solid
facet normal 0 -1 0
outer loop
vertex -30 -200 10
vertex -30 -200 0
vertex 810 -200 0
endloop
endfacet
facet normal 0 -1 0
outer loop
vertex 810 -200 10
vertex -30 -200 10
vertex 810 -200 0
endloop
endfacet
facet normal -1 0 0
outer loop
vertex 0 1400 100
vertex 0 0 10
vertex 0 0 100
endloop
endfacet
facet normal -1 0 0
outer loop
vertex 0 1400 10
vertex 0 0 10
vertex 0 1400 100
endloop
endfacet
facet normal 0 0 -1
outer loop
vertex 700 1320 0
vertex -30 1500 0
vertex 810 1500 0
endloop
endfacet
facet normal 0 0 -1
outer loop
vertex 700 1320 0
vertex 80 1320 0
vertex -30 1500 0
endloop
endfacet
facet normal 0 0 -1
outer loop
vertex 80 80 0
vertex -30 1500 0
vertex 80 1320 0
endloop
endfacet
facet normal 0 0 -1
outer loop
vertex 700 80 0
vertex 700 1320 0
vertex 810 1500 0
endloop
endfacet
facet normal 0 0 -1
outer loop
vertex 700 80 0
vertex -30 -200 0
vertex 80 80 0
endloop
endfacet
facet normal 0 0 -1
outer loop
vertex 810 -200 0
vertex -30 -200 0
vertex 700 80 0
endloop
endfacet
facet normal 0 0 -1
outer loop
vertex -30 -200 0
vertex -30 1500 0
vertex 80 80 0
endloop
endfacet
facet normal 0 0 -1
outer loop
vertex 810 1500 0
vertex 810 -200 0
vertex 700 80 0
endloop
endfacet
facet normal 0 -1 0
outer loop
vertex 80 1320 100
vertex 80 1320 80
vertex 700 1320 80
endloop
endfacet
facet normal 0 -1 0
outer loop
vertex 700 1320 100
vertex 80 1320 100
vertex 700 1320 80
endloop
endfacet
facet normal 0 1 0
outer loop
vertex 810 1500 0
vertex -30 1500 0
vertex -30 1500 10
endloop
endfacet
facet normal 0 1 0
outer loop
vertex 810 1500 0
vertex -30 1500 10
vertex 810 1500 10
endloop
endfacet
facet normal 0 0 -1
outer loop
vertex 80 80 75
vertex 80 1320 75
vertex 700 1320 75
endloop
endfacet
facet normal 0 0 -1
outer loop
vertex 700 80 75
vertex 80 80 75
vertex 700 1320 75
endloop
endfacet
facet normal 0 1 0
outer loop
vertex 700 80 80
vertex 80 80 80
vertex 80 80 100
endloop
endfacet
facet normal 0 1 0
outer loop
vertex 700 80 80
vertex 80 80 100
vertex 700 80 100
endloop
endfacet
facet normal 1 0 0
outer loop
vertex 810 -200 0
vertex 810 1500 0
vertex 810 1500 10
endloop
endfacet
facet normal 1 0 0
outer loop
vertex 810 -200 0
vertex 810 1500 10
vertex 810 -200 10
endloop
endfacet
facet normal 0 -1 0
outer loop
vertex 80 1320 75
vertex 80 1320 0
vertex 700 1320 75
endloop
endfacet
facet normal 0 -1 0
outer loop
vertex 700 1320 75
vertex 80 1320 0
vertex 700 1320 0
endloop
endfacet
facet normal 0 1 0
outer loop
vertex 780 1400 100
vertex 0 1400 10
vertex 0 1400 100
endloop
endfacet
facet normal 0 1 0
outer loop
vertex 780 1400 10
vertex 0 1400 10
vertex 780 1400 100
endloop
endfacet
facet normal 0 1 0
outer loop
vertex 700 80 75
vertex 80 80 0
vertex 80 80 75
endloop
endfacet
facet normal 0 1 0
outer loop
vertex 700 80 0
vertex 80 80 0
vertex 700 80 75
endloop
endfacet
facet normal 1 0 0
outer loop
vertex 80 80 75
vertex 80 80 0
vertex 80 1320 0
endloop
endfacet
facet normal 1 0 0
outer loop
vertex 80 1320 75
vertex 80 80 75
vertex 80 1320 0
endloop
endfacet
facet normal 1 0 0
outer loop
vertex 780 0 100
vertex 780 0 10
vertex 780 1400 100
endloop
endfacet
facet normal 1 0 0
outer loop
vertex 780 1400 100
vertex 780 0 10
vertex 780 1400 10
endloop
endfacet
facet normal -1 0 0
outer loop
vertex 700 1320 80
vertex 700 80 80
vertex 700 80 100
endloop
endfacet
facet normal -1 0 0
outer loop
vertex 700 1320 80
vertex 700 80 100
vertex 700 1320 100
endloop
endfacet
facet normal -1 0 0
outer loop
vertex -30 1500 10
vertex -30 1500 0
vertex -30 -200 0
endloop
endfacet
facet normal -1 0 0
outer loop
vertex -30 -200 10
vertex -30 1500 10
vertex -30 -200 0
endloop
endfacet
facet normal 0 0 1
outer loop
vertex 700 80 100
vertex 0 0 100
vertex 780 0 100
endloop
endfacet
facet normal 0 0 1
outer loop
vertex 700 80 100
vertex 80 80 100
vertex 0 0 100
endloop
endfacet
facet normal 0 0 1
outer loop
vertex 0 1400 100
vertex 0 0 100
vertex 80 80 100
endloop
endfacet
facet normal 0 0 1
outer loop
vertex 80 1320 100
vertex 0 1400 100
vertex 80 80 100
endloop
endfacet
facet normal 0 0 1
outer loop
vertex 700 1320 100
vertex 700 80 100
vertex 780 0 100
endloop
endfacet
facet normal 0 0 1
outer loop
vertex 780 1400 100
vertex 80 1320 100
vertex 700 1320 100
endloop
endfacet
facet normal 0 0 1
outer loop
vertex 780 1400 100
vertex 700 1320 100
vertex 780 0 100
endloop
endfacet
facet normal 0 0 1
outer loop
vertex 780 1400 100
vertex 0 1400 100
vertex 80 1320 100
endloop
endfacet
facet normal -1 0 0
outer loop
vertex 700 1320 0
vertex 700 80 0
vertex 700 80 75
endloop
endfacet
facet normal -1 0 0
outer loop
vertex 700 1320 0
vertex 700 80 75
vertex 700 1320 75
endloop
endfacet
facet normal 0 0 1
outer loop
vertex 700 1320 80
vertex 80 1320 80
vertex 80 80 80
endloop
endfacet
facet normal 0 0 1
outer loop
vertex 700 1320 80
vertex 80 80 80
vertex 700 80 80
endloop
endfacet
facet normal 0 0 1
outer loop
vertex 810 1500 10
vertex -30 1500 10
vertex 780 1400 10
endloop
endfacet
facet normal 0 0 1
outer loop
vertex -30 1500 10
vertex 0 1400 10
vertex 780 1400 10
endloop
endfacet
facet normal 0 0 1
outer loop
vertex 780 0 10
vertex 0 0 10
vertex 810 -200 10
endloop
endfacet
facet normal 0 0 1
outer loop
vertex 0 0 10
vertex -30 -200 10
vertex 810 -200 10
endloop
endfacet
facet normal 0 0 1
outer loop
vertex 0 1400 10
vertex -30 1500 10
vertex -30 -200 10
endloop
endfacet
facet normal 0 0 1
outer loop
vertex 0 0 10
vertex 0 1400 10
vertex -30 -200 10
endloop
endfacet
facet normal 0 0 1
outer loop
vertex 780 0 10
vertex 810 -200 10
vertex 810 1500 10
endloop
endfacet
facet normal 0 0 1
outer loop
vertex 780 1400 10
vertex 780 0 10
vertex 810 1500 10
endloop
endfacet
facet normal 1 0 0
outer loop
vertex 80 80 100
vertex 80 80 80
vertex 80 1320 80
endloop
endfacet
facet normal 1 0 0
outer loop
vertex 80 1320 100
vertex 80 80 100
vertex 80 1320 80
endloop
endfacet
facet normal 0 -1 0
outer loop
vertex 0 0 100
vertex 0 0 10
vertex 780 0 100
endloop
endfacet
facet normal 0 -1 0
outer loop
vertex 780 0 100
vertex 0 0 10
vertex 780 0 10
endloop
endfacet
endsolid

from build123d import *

# Parameters (mm, degrees)
F0_W     = 780
F0_H     = 1400
F0_W_2   = 620
F0_H_2   = 1240
F1_DEPTH = 100
F2_W     = 840
F2_H     = 1700
F2_W_2   = 780
F2_H_2   = 1400
F3_DEPTH = 10
F5_W     = 620
F5_H     = 1240
F6_DEPTH = 5


with BuildPart() as f1:
    # F0 (on Top) → F1 (new body)
    with BuildSketch(Plane.XY):
        with Locations((390, 700)):
            Rectangle(F0_W, F0_H)
        with Locations((390, 700)):
            Rectangle(F0_W_2, F0_H_2, mode=Mode.SUBTRACT)
    extrude(amount=F1_DEPTH)

    # F2 (on face) → F3 (join)
    with BuildSketch(Plane(origin=(0, 0, 0), x_dir=(1, 0, 0), z_dir=(0, 0, -1))):
        with Locations((390, -650)):
            Rectangle(F2_W, F2_H)
        with Locations((390, -700)):
            Rectangle(F2_W_2, F2_H_2, mode=Mode.SUBTRACT)
    extrude(amount=-F3_DEPTH)

    # F5 (on offset) → F6 (join)
    with BuildSketch(Plane.XY.offset(75)):
        with Locations((390, 700)):
            Rectangle(F5_W, F5_H)
    extrude(amount=F6_DEPTH)


solid = f1.part
